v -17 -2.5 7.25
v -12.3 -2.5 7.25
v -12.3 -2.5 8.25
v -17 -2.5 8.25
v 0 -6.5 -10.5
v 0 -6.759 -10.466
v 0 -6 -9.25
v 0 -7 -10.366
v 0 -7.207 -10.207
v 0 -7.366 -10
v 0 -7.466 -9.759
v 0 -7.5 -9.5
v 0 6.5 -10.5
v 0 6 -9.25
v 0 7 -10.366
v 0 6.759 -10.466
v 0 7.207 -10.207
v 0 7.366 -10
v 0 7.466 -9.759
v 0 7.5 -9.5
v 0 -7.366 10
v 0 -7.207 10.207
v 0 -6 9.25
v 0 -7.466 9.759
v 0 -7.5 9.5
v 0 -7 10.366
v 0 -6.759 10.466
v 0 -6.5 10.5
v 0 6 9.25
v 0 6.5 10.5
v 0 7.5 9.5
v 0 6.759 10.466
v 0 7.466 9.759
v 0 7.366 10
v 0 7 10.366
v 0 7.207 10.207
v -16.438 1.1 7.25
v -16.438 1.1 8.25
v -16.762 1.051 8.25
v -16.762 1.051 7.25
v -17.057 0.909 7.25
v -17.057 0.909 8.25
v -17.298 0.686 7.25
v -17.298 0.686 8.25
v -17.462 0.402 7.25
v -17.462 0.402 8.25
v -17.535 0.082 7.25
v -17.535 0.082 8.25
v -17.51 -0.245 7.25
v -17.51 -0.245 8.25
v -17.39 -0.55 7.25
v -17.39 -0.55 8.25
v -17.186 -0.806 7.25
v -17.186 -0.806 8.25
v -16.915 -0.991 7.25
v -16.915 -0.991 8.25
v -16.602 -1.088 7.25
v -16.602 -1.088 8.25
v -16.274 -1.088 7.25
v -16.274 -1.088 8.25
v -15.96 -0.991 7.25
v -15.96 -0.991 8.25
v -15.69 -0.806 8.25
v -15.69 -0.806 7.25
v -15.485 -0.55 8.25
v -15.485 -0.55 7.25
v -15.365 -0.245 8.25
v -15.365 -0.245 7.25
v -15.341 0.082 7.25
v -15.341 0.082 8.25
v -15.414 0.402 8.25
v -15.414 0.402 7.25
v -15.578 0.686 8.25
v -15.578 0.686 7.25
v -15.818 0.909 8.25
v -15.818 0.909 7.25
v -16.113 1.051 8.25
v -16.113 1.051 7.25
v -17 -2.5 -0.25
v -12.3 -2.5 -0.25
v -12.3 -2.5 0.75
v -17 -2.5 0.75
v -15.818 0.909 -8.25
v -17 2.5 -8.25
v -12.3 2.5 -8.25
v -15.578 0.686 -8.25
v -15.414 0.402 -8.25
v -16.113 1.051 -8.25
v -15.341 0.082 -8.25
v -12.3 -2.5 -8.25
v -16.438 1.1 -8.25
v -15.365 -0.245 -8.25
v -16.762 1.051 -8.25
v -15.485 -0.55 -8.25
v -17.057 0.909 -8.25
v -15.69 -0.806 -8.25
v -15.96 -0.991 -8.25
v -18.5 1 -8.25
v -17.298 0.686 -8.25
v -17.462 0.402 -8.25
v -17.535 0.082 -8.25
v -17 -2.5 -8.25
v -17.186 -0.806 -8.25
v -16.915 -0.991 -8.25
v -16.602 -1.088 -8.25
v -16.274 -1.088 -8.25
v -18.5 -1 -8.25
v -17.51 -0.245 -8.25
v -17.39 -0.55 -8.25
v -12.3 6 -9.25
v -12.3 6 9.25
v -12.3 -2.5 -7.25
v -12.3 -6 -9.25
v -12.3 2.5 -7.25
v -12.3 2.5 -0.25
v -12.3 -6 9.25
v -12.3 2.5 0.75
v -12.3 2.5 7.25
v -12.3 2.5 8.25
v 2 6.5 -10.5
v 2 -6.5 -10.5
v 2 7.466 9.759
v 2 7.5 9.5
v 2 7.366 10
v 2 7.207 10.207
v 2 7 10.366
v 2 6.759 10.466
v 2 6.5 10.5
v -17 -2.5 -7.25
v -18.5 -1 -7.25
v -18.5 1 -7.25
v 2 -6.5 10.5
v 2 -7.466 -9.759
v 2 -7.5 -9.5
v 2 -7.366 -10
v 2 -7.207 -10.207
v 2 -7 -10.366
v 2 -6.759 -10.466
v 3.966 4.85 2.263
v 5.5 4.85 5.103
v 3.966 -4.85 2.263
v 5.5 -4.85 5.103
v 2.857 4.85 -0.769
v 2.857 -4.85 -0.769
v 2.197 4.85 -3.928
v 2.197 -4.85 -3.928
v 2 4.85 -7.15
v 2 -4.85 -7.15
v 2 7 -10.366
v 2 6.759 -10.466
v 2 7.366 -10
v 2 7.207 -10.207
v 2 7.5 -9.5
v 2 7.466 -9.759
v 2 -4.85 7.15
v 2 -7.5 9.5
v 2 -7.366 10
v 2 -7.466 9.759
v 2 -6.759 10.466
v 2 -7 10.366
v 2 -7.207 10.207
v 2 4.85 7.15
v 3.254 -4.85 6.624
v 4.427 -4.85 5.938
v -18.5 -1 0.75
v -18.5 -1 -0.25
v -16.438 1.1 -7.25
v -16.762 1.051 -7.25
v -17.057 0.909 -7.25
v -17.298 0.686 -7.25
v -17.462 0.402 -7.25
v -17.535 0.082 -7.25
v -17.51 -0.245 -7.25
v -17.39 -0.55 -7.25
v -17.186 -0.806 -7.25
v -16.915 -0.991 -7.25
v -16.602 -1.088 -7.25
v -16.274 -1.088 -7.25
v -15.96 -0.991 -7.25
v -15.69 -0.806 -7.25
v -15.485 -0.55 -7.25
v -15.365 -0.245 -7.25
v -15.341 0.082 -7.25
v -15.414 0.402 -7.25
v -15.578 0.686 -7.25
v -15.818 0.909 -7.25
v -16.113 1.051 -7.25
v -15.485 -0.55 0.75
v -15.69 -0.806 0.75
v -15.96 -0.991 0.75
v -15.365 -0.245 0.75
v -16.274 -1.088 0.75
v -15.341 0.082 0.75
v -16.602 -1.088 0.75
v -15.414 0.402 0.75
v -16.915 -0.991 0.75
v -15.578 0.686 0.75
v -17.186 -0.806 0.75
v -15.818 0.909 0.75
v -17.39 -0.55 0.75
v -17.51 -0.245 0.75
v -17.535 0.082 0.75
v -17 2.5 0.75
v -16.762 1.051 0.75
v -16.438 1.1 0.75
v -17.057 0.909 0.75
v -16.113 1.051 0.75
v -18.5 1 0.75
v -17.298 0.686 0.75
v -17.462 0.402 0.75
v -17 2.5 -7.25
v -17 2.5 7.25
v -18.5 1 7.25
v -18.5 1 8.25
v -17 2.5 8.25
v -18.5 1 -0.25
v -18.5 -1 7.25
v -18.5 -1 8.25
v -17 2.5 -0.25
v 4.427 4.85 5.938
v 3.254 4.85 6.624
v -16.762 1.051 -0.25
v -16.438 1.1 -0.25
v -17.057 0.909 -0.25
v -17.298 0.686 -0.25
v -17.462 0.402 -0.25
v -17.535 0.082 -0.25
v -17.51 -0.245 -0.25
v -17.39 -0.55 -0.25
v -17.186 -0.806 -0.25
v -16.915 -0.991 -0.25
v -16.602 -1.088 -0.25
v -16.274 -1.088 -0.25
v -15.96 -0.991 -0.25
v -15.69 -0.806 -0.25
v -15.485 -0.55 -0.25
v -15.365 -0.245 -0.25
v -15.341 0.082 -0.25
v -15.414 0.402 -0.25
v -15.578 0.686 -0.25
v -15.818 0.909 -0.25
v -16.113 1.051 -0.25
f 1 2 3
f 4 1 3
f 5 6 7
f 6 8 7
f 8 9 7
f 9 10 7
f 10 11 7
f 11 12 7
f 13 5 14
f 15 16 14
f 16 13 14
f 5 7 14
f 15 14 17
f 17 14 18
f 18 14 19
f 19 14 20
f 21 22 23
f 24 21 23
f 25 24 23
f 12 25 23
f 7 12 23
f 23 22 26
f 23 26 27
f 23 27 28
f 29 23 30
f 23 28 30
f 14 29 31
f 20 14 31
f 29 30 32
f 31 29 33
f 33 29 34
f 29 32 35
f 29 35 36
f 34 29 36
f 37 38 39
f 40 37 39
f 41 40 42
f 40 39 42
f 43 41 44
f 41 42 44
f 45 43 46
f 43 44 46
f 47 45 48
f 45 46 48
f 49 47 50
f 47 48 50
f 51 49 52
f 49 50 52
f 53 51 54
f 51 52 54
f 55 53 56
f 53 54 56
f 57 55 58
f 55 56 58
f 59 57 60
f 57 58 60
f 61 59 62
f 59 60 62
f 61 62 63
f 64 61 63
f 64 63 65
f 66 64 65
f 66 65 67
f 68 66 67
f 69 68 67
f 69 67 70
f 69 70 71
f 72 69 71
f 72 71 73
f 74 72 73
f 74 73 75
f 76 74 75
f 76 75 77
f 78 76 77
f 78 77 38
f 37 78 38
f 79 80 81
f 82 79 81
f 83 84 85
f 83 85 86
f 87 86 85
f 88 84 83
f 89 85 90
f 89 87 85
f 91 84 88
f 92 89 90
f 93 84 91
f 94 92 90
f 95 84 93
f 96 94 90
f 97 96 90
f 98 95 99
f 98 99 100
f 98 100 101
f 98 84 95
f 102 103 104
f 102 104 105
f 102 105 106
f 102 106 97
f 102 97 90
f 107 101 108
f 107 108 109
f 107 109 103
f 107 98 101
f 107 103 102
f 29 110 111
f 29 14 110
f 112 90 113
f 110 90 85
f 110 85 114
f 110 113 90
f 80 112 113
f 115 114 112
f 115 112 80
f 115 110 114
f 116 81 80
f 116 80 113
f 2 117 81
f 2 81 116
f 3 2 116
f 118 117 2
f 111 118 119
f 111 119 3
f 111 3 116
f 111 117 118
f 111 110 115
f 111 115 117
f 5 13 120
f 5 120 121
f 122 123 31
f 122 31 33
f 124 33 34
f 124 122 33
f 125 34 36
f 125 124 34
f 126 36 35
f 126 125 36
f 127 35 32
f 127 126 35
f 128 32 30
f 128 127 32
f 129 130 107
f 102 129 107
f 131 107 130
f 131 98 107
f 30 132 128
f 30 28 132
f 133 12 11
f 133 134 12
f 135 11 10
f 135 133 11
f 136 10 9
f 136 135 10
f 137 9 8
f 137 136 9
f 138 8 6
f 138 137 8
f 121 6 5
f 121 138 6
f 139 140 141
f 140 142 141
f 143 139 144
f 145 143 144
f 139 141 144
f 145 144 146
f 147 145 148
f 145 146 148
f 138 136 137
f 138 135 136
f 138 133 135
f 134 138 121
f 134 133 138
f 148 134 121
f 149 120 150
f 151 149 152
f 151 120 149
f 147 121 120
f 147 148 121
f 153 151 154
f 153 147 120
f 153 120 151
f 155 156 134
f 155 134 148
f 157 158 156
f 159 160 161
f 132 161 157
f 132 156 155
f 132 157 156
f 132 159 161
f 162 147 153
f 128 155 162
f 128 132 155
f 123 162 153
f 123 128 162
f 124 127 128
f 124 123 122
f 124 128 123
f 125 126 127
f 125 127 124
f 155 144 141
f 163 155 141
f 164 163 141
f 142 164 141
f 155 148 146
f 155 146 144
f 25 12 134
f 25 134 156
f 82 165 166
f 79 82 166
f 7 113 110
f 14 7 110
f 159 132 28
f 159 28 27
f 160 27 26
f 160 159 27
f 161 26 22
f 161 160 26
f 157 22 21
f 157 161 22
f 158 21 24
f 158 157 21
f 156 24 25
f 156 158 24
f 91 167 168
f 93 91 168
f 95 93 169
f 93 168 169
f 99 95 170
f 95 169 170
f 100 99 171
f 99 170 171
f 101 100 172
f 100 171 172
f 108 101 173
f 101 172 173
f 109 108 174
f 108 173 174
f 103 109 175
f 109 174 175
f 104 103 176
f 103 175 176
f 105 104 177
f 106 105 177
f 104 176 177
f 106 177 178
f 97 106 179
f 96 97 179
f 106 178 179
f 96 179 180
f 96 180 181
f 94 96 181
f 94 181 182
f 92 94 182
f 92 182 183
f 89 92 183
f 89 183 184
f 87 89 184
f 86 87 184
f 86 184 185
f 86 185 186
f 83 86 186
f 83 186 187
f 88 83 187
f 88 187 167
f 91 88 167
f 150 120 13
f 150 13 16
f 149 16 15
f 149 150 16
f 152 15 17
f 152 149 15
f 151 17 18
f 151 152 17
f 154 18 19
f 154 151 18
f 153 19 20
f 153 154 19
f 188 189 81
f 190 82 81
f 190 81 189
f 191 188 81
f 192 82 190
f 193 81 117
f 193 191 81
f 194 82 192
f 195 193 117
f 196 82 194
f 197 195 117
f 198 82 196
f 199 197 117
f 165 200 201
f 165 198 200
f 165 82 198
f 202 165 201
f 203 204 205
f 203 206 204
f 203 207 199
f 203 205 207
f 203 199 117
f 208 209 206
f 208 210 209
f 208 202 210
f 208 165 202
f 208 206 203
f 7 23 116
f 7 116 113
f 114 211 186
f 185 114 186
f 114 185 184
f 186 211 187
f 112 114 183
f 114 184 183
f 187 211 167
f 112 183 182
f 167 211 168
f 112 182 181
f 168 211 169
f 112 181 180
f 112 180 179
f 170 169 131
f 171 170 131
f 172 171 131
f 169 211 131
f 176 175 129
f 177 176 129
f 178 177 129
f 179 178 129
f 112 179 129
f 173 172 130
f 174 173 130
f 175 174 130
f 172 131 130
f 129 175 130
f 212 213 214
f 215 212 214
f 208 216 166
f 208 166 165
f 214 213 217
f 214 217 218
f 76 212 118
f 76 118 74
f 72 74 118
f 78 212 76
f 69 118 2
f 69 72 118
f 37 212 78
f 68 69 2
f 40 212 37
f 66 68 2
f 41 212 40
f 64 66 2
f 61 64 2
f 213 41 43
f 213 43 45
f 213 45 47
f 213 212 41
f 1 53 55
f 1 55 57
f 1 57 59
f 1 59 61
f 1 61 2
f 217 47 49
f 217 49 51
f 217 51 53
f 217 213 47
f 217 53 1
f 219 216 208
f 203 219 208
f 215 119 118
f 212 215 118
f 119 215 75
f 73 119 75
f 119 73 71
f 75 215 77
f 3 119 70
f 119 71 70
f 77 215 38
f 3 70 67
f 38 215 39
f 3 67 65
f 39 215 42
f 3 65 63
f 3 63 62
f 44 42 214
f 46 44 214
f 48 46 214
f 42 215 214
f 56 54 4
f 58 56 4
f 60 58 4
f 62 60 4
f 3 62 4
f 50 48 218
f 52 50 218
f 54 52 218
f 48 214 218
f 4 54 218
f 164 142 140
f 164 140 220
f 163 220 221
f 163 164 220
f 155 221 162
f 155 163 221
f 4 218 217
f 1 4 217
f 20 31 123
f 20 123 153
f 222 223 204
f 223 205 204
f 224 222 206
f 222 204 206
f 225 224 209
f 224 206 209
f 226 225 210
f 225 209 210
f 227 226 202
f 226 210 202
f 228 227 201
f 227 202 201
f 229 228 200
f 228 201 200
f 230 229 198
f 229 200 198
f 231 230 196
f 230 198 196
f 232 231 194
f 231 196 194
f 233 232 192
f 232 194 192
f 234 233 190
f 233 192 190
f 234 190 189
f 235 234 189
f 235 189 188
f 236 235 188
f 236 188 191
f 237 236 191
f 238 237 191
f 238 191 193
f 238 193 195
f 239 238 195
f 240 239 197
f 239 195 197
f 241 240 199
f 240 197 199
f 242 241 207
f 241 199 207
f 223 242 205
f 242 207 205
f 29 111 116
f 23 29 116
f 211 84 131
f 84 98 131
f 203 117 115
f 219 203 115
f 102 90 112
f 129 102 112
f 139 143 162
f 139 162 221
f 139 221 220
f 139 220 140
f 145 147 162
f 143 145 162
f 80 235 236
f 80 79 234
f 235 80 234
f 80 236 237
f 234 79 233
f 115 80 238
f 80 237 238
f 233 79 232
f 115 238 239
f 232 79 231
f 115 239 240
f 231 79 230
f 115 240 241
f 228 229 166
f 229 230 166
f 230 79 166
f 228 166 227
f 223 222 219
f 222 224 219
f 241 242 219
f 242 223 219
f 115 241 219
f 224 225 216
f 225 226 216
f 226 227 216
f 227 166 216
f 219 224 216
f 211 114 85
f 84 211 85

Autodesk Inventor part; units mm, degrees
ref_plane "YZ Plane" through (0, 0, 0) normal (1, 0, 0) x (0, 1, 0)
ref_plane "XZ Plane" through (0, 0, 0) normal (0, 1, 0) x (-1, 0, 0)
ref_plane "XY Plane" through (0, 0, 0) normal (0, 0, 1) x (1, 0, 0)
sketch "Sketch1" plane through (0, 0, 0) normal (1, 0, 0) x (0, 1, 0)
  line L0 (-7.5, 10.5) -> (7.5, 10.5)
  line L1 (7.5, 10.5) -> (7.5, -10.5)
  line L2 (7.5, -10.5) -> (-7.5, -10.5)
  line L3 (-7.5, -10.5) -> (-7.5, 10.5)
  point P0 (0, 0)
  dimension "d0" = 21
  dimension "d1" = 15
  dimension "d2" = 7.5
  dimension "d3" = 10.5
extrude "Extrusion1" add sketch "Sketch1" along normal blind 2
fillet "Fillet1" radius 1 4 edges at (1, -7.5, -10.5) (1, 7.5, -10.5) (1, 7.5, 10.5) (1, -7.5, 10.5)
sketch "Sketch2" plane through (2, 0, 0) normal (1, 0, 0) x (0, 0, -1)
  line L0 (-7.15, 4.85) -> (7.15, 4.85)
  line L1 (7.15, 4.85) -> (7.15, -4.85)
  line L2 (7.15, -4.85) -> (-7.15, -4.85)
  line L3 (-7.15, -4.85) -> (-7.15, 4.85)
  point P0 (0, 0)
  dimension "d7" = 4.85
  dimension "d8" = 9.7
  dimension "d9" = 14.3
  dimension "d10" = 7.15
ref_plane "Work Plane1" through (2, -4.85, 7.15) normal (0, -1, 0) x (1, 0, 0)
sketch "Sketch3" plane through (2, -4.85, 7.15) normal (0, -1, 0) x (1, 0, 0)
  arc A0 (3.5, -2.0473) -> (0, 0) centre (-3.3399, -9.7251) ccw
  line L0 (0, -16.65) -> (0, 2.35) projected
  arc A1 (3.5, -2.0473) -> (0, -14.3) centre (22.3145, -14.0479) ccw
  point P0 (-2, -7.15)
  point P1 (0, -13.7959)
  dimension "d11" = 3.5
extrude "Extrusion2" add sketch "Sketch3" against normal blind 9.7
sketch "Sketch4" plane through (0, 0, 0) normal (-1, 0, 0) x (0, 0, 1)
  line L0 (9.25, -6) -> (-9.25, -6)
  line L1 (-9.25, -6) -> (-9.25, 6)
  line L2 (-9.25, 6) -> (9.25, 6)
  line L3 (9.25, 6) -> (9.25, -6)
  line L4 (9.5, -7.5) -> (-9.5, -7.5) projected
  line L5 (10.5, 6.5) -> (10.5, -6.5) projected
  point P0 (0, 0)
  dimension "d14" = 18.5
  dimension "d15" = 12
  dimension "d16" = 1.5
  dimension "d17" = 1.25
extrude "Extrusion3" add sketch "Sketch4" along normal blind 12.3
sketch "Sketch5" plane through (-12.3, 0, 0) normal (-1, 0, 0) x (0, 0, 1)
  line L0 (9.25, -6) -> (9.25, 6) projected
  line L1 (-9.25, -6) -> (-9.25, 6) projected
  line L2 (9.25, 2.5) -> (-9.25, 2.5)
  line L3 (-9.25, 2.5) -> (-9.25, -2.5)
  line L4 (-9.25, -2.5) -> (9.25, -2.5)
  line L5 (9.25, -2.5) -> (9.25, 2.5)
  line L6 (9.25, 6) -> (-9.25, 6) projected
  point P0 (0, 0)
  point P1 (9.25, -2.5)
  point P2 (-9.25, 2.5)
  dimension "d20" = 5
  dimension "d21" = 3.5
extrude "Extrusion4" add sketch "Sketch5" along normal blind 6.2 contours L4 L1 L2 L0
sketch "Sketch6" plane through (-18.5, 0, 0) normal (-1, 0, 0) x (0, 0, 1)
  line L0 (9.25, 2.5) -> (-9.25, 2.5) projected
  line L1 (-9.25, 2.5) -> (-9.25, -2.5) projected
  line L2 (-9.25, -2.5) -> (9.25, -2.5) projected
  line L3 (9.25, -2.5) -> (9.25, 2.5) projected
  line L4 (9.25, 2.5) -> (8.25, 2.5)
  line L5 (8.25, 2.5) -> (8.25, -2.5)
  line L6 (8.25, -2.5) -> (9.25, -2.5)
  line L7 (9.25, -2.5) -> (9.25, 2.5)
  line L8 (7.25, -2.5) -> (0.75, -2.5)
  line L9 (0.75, -2.5) -> (0.75, 2.5)
  line L10 (0.75, 2.5) -> (7.25, 2.5)
  line L11 (7.25, 2.5) -> (7.25, -2.5)
  line L12 (-9.25, 2.5) -> (9.25, 2.5) projected
  line L13 (-7.25, -2.5) -> (-0.25, -2.5)
  line L14 (-0.25, -2.5) -> (-0.25, 2.5)
  line L15 (-0.25, 2.5) -> (-7.25, 2.5)
  line L16 (-7.25, 2.5) -> (-7.25, -2.5)
  line L17 (9.25, -2.5) -> (-9.25, -2.5) projected
  line L18 (-9.25, 2.5) -> (-8.25, 2.5)
  line L19 (-8.25, 2.5) -> (-8.25, -2.5)
  line L20 (-8.25, -2.5) -> (-9.25, -2.5)
  line L21 (-9.25, -2.5) -> (-9.25, 2.5)
  point P0 (0, 0)
  point P1 (-8.25, -2.5)
  point P2 (-0.25, -2.5)
  point P3 (7.25, 2.5)
  dimension "d24" = 1
  dimension "d25" = 1
  dimension "d26" = 1
  dimension "d27" = 1
  dimension "d28" = 1
  dimension "d29" = 6.5
extrude "Extrusion5" cut sketch "Sketch6" against normal blind 6.2 contours L3 L2 L5 L0 | L11 L2 L9 L0 | L14 L2 L16 L0 | L19 L2 L1 L0
chamfer "Chamfer1" distance 1.5 angle 45 6 edges at (-18.5, 2.5, -7.75) (-18.5, -2.5, -7.75) (-18.5, -2.5, 0.25) (-18.5, 2.5, 0.25) (-18.5, -2.5, 7.75) (-18.5, 2.5, 7.75)
sketch "Sketch7" plane through (-12.3, -2.5, -8.25) normal (0, 0, -1) x (-1, 0, 0)
  line L0 (6.2, 1.5) -> (4.7, 0) projected
  line L1 (6.2, 3.5) -> (6.2, 1.5) projected
  line L2 (4.7, 5) -> (6.2, 3.5) projected
  line L3 (0, 5) -> (4.7, 5) projected
  line L4 (0, 5) -> (0, 0) projected
  line L5 (4.7, 0) -> (0, 0) projected
  point P0 (-12.3, 2.5)
  point P1 (5.2, 2.5)
  point P2 (4.1377, 2.5)
hole "Hole1" at (-16.4377, 0, -8.25) direction (0, 0, 1) diameter 2.2 end through all
sketch "Sketch8" plane through (0, 0, 0) normal (-1, 0, 0) x (0, 0, 1)
  line L0 (-9.7, -6.55) -> (9.7, -6.55)
  line L1 (9.7, -6.55) -> (9.7, 6.55)
  line L2 (9.7, 6.55) -> (-9.7, 6.55)
  line L3 (-9.7, 6.55) -> (-9.7, -6.55)
  line L4 (-9.7, -6.55) -> (9.7, 6.55) construction
  line L5 (9.7, -6.55) -> (-9.7, 6.55) construction
  point P0 (0, 0)
  dimension "d42" = 19.4
  dimension "d43" = 13.1
properties part number "Rocker Switch" material "ABS Plastic"
